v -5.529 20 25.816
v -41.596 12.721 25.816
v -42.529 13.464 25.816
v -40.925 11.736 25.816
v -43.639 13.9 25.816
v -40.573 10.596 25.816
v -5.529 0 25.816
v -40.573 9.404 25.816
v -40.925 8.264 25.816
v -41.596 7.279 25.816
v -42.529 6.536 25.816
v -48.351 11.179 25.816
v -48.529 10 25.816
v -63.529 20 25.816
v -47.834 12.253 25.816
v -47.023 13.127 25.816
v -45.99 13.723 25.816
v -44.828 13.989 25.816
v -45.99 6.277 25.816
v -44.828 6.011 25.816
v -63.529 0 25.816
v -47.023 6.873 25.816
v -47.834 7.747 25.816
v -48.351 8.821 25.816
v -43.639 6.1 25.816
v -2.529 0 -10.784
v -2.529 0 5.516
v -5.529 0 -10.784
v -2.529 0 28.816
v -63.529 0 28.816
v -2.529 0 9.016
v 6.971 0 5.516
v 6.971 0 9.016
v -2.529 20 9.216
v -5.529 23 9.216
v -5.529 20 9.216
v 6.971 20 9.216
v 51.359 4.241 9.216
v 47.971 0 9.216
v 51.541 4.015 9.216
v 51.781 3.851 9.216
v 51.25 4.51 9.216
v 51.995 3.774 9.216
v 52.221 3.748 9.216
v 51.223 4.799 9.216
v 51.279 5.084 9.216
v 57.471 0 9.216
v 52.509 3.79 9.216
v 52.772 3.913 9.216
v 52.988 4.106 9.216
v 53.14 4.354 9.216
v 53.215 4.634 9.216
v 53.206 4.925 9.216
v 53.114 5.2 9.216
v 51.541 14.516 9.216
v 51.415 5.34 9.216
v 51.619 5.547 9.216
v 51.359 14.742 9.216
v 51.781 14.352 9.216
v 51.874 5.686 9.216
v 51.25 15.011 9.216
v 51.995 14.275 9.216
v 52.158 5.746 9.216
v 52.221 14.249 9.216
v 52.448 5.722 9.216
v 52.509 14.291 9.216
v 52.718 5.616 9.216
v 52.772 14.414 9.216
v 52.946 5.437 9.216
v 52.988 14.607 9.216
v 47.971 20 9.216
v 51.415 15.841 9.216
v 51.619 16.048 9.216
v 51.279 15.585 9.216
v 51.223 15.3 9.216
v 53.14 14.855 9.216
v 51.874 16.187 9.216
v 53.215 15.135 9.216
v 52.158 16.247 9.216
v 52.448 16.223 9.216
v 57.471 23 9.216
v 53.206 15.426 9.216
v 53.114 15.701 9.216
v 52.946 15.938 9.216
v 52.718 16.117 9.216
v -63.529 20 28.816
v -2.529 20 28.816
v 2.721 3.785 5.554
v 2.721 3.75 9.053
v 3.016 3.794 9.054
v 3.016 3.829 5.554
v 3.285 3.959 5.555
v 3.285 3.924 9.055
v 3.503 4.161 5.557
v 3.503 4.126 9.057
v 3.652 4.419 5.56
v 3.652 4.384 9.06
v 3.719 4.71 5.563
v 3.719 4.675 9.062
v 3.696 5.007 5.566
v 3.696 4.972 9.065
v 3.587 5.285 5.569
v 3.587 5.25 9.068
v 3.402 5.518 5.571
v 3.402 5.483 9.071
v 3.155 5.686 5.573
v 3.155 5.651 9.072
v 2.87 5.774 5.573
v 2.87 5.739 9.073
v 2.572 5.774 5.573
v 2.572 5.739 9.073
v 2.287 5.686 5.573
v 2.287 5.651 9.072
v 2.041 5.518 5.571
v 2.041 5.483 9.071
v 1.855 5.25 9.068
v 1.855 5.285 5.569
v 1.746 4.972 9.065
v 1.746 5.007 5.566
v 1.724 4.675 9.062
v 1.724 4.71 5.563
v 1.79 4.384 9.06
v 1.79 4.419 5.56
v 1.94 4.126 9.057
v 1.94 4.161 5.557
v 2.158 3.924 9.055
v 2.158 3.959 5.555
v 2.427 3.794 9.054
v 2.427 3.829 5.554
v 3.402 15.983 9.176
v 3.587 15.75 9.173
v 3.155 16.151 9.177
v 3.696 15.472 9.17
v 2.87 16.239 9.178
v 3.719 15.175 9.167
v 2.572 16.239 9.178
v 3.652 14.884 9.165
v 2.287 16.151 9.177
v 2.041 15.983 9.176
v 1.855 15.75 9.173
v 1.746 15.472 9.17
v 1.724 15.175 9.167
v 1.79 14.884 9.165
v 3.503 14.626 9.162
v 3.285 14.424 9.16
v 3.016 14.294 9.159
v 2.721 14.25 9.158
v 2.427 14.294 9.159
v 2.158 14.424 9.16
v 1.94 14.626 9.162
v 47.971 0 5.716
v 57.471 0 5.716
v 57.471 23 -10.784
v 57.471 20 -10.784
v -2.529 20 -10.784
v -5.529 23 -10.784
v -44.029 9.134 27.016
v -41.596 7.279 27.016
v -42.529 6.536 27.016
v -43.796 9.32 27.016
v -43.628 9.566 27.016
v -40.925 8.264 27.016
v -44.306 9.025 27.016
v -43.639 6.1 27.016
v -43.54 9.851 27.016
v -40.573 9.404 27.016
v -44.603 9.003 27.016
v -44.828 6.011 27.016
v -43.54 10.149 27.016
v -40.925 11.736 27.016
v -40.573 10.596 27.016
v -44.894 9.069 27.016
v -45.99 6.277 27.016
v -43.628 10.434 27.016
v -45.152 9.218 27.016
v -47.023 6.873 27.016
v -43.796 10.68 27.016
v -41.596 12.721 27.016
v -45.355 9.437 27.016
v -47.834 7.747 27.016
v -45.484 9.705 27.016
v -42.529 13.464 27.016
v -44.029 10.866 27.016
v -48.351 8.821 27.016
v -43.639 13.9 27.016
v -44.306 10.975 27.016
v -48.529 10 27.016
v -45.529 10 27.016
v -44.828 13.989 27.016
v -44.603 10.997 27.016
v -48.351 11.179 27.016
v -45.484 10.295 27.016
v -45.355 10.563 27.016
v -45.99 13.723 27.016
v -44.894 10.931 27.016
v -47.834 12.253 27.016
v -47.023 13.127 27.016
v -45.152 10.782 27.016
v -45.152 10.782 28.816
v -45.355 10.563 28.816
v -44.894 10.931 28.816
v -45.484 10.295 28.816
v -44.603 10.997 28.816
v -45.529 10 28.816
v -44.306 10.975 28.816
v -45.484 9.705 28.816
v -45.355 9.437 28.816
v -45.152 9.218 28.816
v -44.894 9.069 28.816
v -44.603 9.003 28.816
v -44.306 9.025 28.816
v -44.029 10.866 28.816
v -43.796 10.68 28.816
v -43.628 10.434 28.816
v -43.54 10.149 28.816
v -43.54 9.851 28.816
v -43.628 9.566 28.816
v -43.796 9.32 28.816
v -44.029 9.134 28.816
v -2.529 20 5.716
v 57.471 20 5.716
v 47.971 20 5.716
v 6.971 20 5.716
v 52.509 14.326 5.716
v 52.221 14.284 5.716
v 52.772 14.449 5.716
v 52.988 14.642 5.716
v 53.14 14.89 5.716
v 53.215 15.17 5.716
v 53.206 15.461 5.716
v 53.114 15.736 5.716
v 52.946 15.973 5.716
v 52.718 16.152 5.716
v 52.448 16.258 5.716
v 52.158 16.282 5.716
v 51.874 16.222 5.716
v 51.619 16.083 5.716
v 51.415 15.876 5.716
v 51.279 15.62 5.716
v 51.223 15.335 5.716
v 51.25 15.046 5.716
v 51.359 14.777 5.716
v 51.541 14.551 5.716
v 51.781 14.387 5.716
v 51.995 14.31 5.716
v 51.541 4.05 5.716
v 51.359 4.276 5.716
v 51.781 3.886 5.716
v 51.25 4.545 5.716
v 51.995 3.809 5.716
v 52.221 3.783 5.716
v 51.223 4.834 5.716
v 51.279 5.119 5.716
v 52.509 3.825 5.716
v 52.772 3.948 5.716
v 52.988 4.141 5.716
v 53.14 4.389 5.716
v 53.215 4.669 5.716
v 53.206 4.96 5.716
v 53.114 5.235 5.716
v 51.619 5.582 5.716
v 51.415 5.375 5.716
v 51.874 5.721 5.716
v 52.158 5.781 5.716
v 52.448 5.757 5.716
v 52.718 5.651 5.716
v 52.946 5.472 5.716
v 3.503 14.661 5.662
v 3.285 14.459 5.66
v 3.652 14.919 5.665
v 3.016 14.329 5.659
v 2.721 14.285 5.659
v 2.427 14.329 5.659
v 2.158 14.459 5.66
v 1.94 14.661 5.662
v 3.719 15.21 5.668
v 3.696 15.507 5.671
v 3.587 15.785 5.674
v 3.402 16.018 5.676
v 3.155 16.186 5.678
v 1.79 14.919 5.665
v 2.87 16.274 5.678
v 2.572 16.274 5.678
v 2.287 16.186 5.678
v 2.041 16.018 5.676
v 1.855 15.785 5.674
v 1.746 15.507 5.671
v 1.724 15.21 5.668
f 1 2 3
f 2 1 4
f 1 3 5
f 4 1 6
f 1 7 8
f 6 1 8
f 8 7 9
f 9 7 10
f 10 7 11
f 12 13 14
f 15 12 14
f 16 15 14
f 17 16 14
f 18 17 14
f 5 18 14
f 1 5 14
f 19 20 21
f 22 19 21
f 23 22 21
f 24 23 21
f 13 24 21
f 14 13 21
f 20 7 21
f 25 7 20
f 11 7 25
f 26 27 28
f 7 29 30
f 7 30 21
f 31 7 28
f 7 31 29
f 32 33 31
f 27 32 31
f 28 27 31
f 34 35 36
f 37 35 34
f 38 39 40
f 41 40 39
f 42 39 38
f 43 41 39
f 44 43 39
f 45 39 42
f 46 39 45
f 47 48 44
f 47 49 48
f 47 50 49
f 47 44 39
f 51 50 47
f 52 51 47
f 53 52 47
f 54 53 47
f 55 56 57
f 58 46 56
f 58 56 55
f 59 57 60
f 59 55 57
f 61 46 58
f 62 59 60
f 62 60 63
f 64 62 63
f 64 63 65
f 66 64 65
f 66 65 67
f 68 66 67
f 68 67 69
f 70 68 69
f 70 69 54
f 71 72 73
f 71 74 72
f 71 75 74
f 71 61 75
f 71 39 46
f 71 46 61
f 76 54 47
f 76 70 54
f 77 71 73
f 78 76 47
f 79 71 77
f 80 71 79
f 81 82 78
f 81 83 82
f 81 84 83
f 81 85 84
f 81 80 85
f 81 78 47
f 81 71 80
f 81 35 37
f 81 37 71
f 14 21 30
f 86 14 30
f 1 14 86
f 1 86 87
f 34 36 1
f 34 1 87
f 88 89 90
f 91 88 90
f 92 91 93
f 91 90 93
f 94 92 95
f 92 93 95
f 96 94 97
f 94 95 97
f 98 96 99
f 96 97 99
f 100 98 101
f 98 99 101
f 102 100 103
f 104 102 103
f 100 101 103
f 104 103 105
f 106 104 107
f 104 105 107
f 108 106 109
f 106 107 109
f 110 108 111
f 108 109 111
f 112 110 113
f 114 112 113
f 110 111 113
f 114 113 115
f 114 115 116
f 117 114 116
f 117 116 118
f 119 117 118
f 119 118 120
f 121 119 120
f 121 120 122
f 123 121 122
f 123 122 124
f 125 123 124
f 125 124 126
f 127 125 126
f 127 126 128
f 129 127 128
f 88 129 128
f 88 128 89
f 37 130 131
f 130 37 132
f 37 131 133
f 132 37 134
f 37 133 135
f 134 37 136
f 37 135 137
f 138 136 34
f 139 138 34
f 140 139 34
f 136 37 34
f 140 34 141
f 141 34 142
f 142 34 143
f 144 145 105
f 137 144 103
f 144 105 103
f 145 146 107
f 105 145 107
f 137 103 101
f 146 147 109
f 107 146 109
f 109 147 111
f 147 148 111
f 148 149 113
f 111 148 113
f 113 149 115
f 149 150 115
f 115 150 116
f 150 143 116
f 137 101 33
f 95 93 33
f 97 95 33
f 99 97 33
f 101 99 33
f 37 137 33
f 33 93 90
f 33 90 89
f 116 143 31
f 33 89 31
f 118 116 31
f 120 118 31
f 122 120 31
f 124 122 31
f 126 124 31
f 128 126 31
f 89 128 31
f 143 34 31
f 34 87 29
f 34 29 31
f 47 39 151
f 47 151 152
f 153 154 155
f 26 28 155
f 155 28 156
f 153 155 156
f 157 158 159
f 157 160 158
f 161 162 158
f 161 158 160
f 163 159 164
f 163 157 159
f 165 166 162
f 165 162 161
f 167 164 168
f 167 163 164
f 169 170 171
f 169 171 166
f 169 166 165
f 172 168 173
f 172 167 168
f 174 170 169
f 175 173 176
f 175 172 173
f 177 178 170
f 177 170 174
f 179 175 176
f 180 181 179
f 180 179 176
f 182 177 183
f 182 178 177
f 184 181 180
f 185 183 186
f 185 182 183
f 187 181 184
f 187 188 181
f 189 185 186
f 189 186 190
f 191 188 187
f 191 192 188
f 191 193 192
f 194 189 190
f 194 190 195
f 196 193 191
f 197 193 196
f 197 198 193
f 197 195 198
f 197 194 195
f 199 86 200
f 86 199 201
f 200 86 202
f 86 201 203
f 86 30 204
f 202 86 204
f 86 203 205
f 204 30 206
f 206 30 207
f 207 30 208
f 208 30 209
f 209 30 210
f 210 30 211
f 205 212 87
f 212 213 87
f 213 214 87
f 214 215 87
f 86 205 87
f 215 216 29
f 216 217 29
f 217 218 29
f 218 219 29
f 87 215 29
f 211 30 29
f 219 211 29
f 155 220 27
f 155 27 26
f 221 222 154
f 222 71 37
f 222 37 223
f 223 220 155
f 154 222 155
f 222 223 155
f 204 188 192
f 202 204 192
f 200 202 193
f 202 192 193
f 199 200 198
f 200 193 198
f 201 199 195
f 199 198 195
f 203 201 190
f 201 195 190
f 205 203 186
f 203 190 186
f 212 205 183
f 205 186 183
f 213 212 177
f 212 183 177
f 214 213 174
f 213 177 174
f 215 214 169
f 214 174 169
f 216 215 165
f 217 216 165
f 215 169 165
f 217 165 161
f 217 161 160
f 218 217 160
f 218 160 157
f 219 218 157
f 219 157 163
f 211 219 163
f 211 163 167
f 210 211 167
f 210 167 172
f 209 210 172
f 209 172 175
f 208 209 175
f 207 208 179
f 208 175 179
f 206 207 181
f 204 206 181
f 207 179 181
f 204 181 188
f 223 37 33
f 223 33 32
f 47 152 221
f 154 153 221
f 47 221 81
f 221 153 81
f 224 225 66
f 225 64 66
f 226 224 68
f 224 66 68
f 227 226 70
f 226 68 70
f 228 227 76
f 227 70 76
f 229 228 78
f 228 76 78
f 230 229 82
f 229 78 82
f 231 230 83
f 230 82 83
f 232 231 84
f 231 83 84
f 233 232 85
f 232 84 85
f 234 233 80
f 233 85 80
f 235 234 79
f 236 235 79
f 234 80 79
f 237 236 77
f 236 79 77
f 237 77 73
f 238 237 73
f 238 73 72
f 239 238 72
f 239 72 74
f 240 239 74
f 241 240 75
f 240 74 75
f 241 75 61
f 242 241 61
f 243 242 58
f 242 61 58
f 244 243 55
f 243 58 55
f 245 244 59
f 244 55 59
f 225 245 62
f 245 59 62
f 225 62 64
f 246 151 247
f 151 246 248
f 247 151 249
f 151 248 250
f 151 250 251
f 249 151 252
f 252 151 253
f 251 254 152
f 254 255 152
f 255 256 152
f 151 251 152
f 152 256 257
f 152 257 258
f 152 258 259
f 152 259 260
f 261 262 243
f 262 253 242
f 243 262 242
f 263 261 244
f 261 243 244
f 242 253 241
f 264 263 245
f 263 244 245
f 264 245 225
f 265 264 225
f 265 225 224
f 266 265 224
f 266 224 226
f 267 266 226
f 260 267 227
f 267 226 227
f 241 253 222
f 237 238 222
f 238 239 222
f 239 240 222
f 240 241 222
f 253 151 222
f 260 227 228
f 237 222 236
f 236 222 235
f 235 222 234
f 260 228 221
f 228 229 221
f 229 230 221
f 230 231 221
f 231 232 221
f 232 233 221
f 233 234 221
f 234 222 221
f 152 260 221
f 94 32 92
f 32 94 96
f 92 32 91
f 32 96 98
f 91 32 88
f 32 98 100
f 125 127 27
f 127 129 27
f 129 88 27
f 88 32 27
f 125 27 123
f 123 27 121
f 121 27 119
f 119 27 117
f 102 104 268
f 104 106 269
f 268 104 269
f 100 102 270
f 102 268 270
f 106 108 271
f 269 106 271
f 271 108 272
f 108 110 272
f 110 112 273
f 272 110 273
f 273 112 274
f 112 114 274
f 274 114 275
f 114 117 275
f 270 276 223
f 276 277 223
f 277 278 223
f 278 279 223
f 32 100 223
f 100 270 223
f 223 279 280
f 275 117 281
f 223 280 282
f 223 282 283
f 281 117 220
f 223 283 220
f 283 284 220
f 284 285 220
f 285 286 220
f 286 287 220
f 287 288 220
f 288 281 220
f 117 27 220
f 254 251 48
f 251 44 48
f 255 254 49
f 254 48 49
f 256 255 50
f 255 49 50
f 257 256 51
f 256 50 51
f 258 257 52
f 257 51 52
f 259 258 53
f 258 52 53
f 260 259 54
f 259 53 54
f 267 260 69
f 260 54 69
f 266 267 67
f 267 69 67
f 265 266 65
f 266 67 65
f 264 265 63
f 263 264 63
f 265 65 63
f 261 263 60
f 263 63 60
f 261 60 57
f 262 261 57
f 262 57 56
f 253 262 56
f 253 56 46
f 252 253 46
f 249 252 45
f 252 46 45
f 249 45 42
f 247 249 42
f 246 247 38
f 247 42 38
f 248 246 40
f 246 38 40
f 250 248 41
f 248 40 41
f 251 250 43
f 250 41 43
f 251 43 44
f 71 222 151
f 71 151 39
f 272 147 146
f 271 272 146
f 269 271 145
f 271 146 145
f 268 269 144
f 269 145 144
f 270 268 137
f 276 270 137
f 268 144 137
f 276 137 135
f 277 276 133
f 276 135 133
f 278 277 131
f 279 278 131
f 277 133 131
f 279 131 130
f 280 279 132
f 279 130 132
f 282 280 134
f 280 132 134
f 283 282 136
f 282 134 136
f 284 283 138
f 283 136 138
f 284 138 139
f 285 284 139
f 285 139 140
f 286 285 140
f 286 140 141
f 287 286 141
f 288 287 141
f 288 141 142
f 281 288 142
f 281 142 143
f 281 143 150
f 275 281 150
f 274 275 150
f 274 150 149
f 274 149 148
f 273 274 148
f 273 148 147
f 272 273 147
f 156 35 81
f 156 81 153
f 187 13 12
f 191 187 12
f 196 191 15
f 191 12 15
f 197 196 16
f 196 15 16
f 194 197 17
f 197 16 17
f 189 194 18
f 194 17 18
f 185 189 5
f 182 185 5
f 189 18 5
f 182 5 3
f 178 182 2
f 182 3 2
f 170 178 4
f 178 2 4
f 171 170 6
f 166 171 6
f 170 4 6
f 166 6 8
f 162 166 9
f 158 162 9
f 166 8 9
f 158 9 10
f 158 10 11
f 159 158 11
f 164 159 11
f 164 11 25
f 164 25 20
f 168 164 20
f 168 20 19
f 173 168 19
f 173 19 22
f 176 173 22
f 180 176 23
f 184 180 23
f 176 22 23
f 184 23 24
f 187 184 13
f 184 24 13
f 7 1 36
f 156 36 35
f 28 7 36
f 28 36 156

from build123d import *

# Parameters (mm, degrees)
SALIENTE_EXTRUIR1_DEPTH = 20
CROQUIS2_W              = 3
CROQUIS2_H              = 20
SALIENTE_EXTRUIR2_DEPTH = 3
CROQUIS3_W              = 20
CROQUIS3_H              = 3
SALIENTE_EXTRUIR3_DEPTH = 60
SALIENTE_EXTRUIR4_DEPTH = 9.5
CROQUIS5_W              = 9.5
CROQUIS5_H              = 3.5
SALIENTE_EXTRUIR6_DEPTH = 20
CROQUIS6_R              = 4
CORTAR_EXTRUIR1_DEPTH   = 1.2
CROQUIS7_R              = 1
CORTAR_EXTRUIR2_DEPTH   = 1.8
CROQUIS8_R              = 1
CORTAR_EXTRUIR4_DEPTH   = 6.75


with BuildPart() as part:
    # Croquis1 → Saliente-Extruir1 (new body)
    with BuildSketch(Plane(origin=(0, 0, 0), x_dir=(1, 0, 0), z_dir=(0, 1, 0))):
        Polygon((-63.528635851, -28.815731451), (-2.528635851, -28.815731451), (-2.528635851, 10.784268549), (-5.528635851, 10.784268549), (-5.528635851, -25.815731451), (-63.528635851, -25.815731451), align=None)
    extrude(amount=SALIENTE_EXTRUIR1_DEPTH)

    # Croquis2 → Saliente-Extruir2 (add)
    with BuildSketch(Plane(origin=(0, 20, 0), x_dir=(1, 0, 0), z_dir=(0, 1, 0))):
        with Locations((-4.028635851, 0.784268549)):
            Rectangle(CROQUIS2_W, CROQUIS2_H)
    extrude(amount=SALIENTE_EXTRUIR2_DEPTH)

    # Croquis3 → Saliente-Extruir3 (add)
    with BuildSketch(Plane(origin=(-2.528635851, 0, 0), x_dir=(0, 0, -1), z_dir=(1, 0, 0))):
        with Locations((0.784268549, 21.5)):
            Rectangle(CROQUIS3_W, CROQUIS3_H)
    extrude(amount=SALIENTE_EXTRUIR3_DEPTH)

    # Croquis4 → Saliente-Extruir4 (add)
    with BuildSketch(Plane(origin=(-2.528635851, 0, 0), x_dir=(0, 0, -1), z_dir=(1, 0, 0))):
        Polygon((-9.215731451, 20), (-9.015731451, 0), (-5.515731451, 0), (-5.715731451, 20), align=None)
    extrude(amount=SALIENTE_EXTRUIR4_DEPTH)

    # Croquis5 → Saliente-Extruir6 (add)
    with BuildSketch(Plane.XZ.offset(-20)):
        with Locations((52.721364149, 7.465731451)):
            Rectangle(CROQUIS5_W, CROQUIS5_H)
    extrude(amount=SALIENTE_EXTRUIR6_DEPTH)

    # Croquis6 → Cortar-Extruir1 (cut)
    with BuildSketch(Plane(origin=(0, 0, 25.815731451), x_dir=(-1, 0, 0), z_dir=(0, 0, -1))):
        with Locations((44.528635851, 10)):
            Circle(CROQUIS6_R)
    extrude(amount=-CORTAR_EXTRUIR1_DEPTH, mode=Mode.SUBTRACT)

    # Croquis7 → Cortar-Extruir2 (cut)
    with BuildSketch(Plane(origin=(0, 0, 27.015731451), x_dir=(-1, 0, 0), z_dir=(0, 0, -1))):
        with Locations((44.528635851, 10)):
            Circle(CROQUIS7_R)
    extrude(amount=-CORTAR_EXTRUIR2_DEPTH, mode=Mode.SUBTRACT)

    # Croquis8 → Cortar-Extruir4 (cut, symmetric)
    with BuildSketch(Plane(origin=(0, -0.0901483, 9.014829968), x_dir=(1, 0, 0), z_dir=(0, -0.009999500037496644, 0.9999500037496877))):
        with Locations(Location((2.721364149, 15.340652794, 0), (0, 0, 270))):
            Circle(CROQUIS8_R)
        with Locations(Location((2.721364149, 4.840152807, 0), (0, 0, 270))):
            Circle(CROQUIS8_R)
        with Locations(Location((52.221364149, 15.340652794, 0), (0, 0, 270))):
            Circle(CROQUIS8_R)
        with Locations(Location((52.221364149, 4.840152807, 0), (0, 0, 270))):
            Circle(CROQUIS8_R)
    extrude(amount=CORTAR_EXTRUIR4_DEPTH, both=True, mode=Mode.SUBTRACT)


solid = part.part
